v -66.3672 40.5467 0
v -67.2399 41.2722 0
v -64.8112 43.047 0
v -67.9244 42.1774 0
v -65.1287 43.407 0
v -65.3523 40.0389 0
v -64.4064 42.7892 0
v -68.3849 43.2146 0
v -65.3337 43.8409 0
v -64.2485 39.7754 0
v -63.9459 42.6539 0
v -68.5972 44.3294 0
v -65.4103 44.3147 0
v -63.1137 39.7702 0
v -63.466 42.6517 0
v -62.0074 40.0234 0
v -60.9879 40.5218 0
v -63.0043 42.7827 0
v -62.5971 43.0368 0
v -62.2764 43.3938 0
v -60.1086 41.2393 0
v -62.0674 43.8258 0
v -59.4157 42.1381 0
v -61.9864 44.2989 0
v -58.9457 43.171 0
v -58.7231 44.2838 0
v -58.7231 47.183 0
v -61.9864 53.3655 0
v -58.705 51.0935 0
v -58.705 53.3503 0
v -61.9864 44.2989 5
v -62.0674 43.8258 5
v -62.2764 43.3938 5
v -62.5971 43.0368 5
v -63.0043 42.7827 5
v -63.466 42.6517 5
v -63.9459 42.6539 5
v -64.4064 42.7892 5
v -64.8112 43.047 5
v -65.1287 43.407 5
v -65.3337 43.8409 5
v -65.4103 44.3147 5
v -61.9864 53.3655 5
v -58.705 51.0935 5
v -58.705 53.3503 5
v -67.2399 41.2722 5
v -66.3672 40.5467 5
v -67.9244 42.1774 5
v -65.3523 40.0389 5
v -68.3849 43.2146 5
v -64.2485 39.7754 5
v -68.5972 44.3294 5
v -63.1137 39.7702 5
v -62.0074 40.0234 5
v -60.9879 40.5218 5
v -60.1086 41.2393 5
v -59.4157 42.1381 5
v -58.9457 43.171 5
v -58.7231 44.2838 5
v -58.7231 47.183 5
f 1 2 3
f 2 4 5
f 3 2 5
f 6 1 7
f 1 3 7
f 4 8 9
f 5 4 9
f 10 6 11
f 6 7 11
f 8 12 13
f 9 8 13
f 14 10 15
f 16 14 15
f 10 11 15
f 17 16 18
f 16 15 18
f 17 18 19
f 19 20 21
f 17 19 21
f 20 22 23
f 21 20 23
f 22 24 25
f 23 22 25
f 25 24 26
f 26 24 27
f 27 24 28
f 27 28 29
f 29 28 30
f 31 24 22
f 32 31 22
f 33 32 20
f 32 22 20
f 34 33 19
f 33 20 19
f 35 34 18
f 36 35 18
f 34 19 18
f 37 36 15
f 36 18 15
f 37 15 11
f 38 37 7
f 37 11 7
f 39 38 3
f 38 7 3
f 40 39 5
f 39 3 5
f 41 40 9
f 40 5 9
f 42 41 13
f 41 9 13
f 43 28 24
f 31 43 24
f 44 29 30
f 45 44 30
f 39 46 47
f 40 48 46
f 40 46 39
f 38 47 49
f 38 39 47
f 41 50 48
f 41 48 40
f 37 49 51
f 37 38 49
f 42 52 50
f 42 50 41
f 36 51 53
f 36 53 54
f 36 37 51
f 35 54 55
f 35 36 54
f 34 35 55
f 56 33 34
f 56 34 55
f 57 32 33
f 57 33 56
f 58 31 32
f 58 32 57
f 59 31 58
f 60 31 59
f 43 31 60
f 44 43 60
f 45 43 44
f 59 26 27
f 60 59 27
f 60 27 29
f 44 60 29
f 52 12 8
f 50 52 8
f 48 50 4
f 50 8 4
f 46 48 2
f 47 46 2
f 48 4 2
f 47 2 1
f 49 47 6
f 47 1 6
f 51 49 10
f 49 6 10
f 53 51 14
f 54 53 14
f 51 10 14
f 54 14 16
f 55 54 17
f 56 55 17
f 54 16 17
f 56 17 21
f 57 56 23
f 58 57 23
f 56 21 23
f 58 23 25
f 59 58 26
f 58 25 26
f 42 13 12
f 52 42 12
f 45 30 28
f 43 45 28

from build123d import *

# Parameters (mm, degrees)
F1_DEPTH = 5


with BuildPart() as f1:
    # F0 (on Top) → F1 (new body)
    with BuildSketch(Plane.XY):
        with BuildLine():
            Line((-65.410274, 44.314684), (-68.597218, 44.329395))
            ThreePointArc((-68.597218, 44.329395), (-63.681228, 39.740166), (-58.723081, 44.283817))
            Line((-58.723081, 44.283817), (-58.723081, 47.183014))
            Line((-58.723081, 47.183014), (-58.70503, 51.093523))
            Line((-58.70503, 51.093523), (-58.70503, 53.350328))
            Line((-58.70503, 53.350328), (-61.986422, 53.365474))
            Line((-61.986422, 53.365474), (-61.986422, 51.093523))
            Line((-61.986422, 51.093523), (-61.986422, 44.29888))
            ThreePointArc((-61.986422, 44.29888), (-63.70606, 42.635903), (-65.410274, 44.314684))
        make_face()
    extrude(amount=F1_DEPTH)


solid = f1.part
